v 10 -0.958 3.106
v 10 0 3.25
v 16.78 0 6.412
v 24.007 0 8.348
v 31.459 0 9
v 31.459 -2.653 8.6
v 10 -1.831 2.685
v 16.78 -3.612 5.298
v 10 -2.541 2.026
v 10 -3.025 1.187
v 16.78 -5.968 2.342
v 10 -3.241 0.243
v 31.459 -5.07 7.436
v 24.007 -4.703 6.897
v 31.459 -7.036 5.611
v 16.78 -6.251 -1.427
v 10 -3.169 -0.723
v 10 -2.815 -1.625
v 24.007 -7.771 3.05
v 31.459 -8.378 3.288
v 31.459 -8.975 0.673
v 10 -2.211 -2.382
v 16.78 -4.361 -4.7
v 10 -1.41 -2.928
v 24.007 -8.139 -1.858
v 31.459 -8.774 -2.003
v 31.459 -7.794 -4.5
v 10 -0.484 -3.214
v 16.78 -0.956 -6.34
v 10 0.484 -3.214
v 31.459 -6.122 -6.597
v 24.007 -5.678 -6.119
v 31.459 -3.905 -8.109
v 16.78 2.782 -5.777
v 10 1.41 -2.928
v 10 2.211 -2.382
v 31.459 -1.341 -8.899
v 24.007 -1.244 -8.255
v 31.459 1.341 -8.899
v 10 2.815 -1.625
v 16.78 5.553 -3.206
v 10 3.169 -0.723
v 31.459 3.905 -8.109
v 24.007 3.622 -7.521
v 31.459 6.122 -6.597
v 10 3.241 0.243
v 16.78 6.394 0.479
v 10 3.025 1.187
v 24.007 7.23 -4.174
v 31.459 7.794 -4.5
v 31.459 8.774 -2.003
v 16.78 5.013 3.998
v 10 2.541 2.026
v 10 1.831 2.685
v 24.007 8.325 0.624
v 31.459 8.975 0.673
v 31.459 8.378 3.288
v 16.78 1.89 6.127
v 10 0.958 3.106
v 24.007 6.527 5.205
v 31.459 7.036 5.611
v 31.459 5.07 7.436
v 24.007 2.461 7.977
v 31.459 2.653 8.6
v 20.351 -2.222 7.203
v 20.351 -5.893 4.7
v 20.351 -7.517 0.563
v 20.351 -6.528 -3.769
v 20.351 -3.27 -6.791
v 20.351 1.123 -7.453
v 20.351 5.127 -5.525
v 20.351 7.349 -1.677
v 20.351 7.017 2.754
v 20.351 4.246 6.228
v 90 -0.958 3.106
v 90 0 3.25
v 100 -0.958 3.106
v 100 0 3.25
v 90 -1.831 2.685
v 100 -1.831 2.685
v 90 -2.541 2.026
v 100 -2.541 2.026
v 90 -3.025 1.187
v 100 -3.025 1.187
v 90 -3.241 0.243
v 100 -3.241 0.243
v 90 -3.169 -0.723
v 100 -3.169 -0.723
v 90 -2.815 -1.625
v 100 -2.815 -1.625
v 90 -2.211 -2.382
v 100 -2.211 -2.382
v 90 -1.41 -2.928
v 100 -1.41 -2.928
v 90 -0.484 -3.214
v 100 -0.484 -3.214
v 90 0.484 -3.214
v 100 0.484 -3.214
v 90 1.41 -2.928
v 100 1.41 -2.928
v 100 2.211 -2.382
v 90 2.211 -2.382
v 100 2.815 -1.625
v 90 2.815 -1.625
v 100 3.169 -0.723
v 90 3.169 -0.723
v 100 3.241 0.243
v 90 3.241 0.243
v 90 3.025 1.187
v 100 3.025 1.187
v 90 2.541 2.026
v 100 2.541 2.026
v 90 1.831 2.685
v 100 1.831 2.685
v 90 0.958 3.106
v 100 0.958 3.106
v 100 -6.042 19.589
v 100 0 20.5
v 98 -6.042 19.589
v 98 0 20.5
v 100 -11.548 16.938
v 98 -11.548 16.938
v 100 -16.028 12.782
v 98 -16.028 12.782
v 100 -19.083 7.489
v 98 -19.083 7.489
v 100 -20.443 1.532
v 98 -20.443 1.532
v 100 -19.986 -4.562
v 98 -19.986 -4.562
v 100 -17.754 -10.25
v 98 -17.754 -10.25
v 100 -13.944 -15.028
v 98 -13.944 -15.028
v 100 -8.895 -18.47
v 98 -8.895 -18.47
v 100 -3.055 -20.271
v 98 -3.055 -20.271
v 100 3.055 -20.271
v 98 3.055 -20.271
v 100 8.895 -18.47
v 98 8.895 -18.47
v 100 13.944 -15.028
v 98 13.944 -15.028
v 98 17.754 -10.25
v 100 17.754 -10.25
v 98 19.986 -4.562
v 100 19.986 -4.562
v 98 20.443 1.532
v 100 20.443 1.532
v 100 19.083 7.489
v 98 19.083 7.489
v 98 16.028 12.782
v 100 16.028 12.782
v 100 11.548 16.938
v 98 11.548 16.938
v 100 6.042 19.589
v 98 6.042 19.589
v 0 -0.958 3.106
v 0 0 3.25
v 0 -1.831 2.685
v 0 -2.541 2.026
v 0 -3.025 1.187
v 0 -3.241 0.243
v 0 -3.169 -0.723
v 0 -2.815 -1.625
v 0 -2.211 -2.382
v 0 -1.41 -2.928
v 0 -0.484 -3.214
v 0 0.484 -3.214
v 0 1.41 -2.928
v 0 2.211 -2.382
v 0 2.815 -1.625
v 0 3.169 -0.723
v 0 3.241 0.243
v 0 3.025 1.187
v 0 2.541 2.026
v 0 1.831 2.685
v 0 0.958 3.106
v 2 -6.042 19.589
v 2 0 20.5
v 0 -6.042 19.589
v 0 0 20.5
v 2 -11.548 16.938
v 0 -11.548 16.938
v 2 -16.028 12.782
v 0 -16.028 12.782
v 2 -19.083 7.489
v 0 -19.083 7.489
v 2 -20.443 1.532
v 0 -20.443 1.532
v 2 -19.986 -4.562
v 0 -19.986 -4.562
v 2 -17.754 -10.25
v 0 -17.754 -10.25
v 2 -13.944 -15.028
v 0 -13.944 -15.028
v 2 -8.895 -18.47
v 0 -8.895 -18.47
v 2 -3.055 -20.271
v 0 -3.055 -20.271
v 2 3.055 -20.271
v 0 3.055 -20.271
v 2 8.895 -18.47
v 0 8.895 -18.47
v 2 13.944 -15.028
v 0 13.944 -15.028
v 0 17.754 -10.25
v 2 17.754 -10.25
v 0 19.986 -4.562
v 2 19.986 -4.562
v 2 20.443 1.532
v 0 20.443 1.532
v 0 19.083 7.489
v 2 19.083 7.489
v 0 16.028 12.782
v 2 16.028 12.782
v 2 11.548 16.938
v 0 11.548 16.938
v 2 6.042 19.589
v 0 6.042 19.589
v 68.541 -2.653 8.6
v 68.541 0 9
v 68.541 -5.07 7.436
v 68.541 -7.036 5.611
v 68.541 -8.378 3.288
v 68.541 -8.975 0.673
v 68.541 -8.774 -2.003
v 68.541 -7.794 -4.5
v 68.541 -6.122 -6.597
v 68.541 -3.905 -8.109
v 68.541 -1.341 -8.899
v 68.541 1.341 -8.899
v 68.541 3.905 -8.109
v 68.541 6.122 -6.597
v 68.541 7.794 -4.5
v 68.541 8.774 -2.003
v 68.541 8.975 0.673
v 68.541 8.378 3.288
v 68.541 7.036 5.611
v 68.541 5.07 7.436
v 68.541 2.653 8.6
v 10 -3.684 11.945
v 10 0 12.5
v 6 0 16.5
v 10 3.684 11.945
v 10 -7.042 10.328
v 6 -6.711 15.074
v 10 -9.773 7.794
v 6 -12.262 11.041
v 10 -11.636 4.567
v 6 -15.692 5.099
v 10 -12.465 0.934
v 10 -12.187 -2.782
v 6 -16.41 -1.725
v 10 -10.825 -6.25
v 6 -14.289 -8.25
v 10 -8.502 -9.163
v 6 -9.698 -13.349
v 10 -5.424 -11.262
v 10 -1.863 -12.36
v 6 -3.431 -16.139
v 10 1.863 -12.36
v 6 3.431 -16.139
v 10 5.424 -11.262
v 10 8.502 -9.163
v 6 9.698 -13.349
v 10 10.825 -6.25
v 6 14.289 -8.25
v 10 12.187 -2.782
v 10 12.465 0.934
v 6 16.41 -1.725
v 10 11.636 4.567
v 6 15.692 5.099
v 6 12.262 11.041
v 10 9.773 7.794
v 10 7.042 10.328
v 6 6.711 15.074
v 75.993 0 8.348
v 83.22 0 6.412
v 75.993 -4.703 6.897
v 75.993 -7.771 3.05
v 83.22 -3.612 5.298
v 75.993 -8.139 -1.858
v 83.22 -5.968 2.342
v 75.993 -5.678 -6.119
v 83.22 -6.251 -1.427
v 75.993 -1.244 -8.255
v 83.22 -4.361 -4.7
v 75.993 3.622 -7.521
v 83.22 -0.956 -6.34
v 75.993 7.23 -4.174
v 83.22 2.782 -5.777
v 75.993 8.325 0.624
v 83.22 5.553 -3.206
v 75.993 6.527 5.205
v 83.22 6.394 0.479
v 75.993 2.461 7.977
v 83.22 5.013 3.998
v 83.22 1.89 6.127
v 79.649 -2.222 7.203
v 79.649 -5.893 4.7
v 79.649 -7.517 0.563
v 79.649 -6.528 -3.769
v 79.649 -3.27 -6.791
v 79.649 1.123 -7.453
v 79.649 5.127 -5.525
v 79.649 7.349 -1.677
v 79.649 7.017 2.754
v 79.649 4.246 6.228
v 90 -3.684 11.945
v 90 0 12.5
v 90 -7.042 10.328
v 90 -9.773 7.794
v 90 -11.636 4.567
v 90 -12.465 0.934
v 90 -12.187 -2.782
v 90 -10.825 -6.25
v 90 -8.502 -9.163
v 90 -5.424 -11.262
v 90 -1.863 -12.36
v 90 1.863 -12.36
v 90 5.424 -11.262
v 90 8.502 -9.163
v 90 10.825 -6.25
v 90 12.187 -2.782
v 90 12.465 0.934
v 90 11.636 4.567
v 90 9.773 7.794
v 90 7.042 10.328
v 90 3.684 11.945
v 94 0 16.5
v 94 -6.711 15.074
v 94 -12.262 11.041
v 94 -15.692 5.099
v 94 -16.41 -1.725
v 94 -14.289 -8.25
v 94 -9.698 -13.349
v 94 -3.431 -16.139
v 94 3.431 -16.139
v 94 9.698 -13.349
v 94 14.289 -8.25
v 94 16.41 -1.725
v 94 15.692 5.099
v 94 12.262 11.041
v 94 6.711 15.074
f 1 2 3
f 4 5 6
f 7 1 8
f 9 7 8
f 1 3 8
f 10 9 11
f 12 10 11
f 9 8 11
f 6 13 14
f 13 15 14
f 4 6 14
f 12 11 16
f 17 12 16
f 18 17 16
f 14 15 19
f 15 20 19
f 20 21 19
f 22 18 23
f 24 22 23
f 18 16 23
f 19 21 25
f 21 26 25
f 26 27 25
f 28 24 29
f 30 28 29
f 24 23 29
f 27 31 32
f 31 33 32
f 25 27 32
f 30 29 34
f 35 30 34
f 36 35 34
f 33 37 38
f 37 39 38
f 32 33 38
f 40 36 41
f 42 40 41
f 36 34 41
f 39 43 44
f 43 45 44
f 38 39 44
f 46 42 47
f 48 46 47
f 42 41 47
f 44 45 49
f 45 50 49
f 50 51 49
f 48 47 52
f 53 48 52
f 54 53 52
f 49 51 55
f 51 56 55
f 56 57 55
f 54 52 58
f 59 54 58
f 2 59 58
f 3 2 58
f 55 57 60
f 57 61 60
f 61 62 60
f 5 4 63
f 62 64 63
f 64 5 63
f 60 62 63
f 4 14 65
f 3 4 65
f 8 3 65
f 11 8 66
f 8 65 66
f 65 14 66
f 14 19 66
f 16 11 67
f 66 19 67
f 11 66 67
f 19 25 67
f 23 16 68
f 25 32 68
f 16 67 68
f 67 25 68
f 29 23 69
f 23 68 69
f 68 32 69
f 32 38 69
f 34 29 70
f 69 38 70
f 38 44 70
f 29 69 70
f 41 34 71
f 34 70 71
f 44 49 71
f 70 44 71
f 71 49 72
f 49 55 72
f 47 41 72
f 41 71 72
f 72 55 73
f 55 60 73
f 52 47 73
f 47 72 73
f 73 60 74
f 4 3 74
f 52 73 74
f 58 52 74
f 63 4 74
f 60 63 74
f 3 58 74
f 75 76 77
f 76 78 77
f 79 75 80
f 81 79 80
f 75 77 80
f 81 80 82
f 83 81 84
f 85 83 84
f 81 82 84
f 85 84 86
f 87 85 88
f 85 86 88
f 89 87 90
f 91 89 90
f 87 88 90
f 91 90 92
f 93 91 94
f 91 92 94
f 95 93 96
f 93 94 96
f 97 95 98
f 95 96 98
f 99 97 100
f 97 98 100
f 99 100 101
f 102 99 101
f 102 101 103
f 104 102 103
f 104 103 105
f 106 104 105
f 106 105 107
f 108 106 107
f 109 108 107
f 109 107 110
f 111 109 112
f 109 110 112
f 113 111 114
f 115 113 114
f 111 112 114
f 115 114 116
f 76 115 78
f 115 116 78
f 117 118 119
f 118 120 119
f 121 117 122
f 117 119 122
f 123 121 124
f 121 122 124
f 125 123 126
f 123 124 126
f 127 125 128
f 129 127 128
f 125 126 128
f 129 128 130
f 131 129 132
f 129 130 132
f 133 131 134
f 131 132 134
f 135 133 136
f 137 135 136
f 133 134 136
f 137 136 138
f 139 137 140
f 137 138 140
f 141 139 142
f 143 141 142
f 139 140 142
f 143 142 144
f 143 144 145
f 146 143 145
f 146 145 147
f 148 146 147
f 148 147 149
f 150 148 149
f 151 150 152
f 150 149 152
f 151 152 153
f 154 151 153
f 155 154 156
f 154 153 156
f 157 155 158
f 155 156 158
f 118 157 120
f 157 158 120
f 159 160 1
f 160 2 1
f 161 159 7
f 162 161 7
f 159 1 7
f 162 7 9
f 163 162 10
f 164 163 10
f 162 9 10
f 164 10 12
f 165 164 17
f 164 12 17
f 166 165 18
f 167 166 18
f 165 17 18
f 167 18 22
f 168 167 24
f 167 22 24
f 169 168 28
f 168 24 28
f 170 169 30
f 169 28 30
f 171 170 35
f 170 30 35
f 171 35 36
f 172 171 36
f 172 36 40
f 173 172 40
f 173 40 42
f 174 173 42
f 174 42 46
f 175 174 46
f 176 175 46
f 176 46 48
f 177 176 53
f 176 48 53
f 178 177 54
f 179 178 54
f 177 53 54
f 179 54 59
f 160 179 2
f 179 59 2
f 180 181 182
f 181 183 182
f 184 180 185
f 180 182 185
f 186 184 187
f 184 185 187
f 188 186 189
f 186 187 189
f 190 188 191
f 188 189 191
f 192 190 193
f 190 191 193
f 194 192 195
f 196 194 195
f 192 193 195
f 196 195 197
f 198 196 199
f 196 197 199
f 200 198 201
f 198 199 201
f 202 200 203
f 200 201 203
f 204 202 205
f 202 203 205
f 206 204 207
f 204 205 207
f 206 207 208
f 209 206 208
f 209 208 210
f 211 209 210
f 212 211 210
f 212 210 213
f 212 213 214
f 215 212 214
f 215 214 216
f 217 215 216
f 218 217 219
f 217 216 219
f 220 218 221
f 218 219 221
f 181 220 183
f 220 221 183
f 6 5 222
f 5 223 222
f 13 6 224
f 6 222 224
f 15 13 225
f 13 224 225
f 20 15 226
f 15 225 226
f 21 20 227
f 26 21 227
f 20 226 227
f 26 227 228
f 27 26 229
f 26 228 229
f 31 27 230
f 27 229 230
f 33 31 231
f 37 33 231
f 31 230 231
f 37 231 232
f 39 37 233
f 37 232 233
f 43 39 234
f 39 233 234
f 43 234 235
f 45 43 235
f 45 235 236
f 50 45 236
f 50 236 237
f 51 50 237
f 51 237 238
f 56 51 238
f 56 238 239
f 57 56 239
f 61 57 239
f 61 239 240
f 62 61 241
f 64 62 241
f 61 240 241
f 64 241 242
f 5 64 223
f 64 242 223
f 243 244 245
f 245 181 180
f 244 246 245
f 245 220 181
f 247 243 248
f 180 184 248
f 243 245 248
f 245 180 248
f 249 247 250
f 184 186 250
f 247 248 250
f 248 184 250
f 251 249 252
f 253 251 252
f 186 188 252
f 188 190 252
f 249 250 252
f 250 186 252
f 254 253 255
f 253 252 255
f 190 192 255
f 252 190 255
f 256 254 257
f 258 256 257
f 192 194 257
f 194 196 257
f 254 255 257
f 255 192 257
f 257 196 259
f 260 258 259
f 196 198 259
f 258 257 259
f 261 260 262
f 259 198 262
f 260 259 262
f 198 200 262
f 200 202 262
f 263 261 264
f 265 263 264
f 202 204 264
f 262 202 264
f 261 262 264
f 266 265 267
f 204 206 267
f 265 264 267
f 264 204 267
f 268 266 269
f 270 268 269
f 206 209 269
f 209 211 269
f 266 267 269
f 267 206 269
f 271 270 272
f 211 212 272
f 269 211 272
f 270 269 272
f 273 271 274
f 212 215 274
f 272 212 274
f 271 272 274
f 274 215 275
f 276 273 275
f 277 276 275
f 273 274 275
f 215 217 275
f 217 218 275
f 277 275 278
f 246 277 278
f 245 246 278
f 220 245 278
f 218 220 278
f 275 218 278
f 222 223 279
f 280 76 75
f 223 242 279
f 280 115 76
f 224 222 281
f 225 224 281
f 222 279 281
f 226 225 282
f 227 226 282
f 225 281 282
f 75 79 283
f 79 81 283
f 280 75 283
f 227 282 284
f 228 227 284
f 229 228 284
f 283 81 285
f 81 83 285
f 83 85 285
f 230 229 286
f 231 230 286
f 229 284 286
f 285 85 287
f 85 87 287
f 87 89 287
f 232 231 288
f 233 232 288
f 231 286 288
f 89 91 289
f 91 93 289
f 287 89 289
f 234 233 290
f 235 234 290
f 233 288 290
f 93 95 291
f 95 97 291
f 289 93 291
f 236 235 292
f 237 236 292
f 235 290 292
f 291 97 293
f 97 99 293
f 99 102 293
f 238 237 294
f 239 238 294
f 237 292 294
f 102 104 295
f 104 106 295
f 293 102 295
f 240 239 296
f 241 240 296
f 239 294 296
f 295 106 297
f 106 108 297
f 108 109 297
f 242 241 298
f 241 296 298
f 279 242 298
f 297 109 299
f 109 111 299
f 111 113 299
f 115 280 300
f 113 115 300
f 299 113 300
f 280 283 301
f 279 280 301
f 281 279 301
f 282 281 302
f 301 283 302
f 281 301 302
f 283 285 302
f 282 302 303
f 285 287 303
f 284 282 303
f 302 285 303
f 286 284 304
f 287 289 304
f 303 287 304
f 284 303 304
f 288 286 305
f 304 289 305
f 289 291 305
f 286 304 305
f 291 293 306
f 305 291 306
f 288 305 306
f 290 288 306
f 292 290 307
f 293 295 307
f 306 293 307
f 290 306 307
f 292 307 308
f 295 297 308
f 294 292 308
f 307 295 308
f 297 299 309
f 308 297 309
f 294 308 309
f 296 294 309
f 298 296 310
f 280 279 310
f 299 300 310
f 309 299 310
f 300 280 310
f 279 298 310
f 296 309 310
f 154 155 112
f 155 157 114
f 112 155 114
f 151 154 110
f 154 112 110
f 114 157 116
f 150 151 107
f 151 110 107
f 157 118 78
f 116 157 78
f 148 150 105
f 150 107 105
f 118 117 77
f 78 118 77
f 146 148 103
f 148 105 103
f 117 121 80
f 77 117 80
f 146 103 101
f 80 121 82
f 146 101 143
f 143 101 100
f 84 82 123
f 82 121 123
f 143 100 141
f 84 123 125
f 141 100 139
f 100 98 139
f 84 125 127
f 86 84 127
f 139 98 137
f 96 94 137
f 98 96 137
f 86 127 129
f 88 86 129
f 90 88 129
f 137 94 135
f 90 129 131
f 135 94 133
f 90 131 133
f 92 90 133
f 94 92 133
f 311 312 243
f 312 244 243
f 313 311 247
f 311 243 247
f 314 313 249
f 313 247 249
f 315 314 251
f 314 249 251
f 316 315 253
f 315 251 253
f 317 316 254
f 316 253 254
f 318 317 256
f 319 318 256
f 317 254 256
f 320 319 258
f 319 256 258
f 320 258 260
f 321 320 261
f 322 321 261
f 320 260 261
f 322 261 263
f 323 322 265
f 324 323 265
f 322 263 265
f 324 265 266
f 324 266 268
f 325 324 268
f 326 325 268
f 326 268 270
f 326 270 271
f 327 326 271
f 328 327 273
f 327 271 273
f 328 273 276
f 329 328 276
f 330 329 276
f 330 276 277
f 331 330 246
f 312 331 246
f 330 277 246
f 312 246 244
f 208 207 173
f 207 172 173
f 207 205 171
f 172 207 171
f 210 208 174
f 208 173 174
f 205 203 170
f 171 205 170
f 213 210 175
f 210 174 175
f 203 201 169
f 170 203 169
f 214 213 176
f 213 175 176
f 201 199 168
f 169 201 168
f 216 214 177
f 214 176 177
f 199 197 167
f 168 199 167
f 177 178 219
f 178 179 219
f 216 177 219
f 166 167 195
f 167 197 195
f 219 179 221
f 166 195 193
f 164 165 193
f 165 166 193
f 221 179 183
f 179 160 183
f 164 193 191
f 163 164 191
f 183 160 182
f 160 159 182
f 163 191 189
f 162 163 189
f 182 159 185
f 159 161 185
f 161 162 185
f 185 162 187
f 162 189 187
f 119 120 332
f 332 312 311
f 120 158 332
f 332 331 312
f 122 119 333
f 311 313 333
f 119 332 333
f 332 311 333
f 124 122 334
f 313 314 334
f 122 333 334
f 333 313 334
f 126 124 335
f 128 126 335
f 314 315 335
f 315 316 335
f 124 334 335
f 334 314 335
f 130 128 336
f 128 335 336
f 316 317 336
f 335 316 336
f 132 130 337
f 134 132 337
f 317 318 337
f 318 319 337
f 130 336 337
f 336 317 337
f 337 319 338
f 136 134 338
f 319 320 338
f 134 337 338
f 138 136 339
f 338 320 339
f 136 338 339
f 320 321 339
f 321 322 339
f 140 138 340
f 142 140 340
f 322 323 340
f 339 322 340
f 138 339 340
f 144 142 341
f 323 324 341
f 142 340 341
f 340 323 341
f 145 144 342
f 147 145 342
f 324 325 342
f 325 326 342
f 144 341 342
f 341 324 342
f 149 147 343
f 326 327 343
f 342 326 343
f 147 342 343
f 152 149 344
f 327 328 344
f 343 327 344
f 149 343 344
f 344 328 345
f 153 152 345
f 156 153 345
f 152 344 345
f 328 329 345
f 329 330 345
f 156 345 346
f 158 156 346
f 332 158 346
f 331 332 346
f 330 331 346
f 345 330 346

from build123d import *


with BuildPart() as part:
    # Sketch1 → Revolve1 (revolve)
    with BuildSketch(Plane.XY, mode=Mode.PRIVATE) as revolve1_sk:
        with BuildLine():
            Line((0, 3.25), (10, 3.25))
            ThreePointArc((10, 3.25), (20.351145141, 7.537584704), (31.459292144, 9))
            Line((31.459292144, 9), (68.540707856, 9))
            ThreePointArc((68.540707856, 9), (79.648854859, 7.537584704), (90, 3.25))
            Line((90, 3.25), (100, 3.25))
            Line((100, 3.25), (100, 20.5))
            Line((100, 20.5), (98, 20.5))
            Line((98, 20.5), (90, 12.5))
            Line((90, 12.5), (10, 12.5))
            Line((10, 12.5), (2, 20.5))
            Line((2, 20.5), (0, 20.5))
            Line((0, 20.5), (0, 3.25))
        make_face()
    revolve(revolve1_sk.sketch.rotate(Axis((0, 0, 0), (1, 0, 0)), 90), axis=Axis((0, 0, 0), (1, 0, 0)))


solid = part.part
